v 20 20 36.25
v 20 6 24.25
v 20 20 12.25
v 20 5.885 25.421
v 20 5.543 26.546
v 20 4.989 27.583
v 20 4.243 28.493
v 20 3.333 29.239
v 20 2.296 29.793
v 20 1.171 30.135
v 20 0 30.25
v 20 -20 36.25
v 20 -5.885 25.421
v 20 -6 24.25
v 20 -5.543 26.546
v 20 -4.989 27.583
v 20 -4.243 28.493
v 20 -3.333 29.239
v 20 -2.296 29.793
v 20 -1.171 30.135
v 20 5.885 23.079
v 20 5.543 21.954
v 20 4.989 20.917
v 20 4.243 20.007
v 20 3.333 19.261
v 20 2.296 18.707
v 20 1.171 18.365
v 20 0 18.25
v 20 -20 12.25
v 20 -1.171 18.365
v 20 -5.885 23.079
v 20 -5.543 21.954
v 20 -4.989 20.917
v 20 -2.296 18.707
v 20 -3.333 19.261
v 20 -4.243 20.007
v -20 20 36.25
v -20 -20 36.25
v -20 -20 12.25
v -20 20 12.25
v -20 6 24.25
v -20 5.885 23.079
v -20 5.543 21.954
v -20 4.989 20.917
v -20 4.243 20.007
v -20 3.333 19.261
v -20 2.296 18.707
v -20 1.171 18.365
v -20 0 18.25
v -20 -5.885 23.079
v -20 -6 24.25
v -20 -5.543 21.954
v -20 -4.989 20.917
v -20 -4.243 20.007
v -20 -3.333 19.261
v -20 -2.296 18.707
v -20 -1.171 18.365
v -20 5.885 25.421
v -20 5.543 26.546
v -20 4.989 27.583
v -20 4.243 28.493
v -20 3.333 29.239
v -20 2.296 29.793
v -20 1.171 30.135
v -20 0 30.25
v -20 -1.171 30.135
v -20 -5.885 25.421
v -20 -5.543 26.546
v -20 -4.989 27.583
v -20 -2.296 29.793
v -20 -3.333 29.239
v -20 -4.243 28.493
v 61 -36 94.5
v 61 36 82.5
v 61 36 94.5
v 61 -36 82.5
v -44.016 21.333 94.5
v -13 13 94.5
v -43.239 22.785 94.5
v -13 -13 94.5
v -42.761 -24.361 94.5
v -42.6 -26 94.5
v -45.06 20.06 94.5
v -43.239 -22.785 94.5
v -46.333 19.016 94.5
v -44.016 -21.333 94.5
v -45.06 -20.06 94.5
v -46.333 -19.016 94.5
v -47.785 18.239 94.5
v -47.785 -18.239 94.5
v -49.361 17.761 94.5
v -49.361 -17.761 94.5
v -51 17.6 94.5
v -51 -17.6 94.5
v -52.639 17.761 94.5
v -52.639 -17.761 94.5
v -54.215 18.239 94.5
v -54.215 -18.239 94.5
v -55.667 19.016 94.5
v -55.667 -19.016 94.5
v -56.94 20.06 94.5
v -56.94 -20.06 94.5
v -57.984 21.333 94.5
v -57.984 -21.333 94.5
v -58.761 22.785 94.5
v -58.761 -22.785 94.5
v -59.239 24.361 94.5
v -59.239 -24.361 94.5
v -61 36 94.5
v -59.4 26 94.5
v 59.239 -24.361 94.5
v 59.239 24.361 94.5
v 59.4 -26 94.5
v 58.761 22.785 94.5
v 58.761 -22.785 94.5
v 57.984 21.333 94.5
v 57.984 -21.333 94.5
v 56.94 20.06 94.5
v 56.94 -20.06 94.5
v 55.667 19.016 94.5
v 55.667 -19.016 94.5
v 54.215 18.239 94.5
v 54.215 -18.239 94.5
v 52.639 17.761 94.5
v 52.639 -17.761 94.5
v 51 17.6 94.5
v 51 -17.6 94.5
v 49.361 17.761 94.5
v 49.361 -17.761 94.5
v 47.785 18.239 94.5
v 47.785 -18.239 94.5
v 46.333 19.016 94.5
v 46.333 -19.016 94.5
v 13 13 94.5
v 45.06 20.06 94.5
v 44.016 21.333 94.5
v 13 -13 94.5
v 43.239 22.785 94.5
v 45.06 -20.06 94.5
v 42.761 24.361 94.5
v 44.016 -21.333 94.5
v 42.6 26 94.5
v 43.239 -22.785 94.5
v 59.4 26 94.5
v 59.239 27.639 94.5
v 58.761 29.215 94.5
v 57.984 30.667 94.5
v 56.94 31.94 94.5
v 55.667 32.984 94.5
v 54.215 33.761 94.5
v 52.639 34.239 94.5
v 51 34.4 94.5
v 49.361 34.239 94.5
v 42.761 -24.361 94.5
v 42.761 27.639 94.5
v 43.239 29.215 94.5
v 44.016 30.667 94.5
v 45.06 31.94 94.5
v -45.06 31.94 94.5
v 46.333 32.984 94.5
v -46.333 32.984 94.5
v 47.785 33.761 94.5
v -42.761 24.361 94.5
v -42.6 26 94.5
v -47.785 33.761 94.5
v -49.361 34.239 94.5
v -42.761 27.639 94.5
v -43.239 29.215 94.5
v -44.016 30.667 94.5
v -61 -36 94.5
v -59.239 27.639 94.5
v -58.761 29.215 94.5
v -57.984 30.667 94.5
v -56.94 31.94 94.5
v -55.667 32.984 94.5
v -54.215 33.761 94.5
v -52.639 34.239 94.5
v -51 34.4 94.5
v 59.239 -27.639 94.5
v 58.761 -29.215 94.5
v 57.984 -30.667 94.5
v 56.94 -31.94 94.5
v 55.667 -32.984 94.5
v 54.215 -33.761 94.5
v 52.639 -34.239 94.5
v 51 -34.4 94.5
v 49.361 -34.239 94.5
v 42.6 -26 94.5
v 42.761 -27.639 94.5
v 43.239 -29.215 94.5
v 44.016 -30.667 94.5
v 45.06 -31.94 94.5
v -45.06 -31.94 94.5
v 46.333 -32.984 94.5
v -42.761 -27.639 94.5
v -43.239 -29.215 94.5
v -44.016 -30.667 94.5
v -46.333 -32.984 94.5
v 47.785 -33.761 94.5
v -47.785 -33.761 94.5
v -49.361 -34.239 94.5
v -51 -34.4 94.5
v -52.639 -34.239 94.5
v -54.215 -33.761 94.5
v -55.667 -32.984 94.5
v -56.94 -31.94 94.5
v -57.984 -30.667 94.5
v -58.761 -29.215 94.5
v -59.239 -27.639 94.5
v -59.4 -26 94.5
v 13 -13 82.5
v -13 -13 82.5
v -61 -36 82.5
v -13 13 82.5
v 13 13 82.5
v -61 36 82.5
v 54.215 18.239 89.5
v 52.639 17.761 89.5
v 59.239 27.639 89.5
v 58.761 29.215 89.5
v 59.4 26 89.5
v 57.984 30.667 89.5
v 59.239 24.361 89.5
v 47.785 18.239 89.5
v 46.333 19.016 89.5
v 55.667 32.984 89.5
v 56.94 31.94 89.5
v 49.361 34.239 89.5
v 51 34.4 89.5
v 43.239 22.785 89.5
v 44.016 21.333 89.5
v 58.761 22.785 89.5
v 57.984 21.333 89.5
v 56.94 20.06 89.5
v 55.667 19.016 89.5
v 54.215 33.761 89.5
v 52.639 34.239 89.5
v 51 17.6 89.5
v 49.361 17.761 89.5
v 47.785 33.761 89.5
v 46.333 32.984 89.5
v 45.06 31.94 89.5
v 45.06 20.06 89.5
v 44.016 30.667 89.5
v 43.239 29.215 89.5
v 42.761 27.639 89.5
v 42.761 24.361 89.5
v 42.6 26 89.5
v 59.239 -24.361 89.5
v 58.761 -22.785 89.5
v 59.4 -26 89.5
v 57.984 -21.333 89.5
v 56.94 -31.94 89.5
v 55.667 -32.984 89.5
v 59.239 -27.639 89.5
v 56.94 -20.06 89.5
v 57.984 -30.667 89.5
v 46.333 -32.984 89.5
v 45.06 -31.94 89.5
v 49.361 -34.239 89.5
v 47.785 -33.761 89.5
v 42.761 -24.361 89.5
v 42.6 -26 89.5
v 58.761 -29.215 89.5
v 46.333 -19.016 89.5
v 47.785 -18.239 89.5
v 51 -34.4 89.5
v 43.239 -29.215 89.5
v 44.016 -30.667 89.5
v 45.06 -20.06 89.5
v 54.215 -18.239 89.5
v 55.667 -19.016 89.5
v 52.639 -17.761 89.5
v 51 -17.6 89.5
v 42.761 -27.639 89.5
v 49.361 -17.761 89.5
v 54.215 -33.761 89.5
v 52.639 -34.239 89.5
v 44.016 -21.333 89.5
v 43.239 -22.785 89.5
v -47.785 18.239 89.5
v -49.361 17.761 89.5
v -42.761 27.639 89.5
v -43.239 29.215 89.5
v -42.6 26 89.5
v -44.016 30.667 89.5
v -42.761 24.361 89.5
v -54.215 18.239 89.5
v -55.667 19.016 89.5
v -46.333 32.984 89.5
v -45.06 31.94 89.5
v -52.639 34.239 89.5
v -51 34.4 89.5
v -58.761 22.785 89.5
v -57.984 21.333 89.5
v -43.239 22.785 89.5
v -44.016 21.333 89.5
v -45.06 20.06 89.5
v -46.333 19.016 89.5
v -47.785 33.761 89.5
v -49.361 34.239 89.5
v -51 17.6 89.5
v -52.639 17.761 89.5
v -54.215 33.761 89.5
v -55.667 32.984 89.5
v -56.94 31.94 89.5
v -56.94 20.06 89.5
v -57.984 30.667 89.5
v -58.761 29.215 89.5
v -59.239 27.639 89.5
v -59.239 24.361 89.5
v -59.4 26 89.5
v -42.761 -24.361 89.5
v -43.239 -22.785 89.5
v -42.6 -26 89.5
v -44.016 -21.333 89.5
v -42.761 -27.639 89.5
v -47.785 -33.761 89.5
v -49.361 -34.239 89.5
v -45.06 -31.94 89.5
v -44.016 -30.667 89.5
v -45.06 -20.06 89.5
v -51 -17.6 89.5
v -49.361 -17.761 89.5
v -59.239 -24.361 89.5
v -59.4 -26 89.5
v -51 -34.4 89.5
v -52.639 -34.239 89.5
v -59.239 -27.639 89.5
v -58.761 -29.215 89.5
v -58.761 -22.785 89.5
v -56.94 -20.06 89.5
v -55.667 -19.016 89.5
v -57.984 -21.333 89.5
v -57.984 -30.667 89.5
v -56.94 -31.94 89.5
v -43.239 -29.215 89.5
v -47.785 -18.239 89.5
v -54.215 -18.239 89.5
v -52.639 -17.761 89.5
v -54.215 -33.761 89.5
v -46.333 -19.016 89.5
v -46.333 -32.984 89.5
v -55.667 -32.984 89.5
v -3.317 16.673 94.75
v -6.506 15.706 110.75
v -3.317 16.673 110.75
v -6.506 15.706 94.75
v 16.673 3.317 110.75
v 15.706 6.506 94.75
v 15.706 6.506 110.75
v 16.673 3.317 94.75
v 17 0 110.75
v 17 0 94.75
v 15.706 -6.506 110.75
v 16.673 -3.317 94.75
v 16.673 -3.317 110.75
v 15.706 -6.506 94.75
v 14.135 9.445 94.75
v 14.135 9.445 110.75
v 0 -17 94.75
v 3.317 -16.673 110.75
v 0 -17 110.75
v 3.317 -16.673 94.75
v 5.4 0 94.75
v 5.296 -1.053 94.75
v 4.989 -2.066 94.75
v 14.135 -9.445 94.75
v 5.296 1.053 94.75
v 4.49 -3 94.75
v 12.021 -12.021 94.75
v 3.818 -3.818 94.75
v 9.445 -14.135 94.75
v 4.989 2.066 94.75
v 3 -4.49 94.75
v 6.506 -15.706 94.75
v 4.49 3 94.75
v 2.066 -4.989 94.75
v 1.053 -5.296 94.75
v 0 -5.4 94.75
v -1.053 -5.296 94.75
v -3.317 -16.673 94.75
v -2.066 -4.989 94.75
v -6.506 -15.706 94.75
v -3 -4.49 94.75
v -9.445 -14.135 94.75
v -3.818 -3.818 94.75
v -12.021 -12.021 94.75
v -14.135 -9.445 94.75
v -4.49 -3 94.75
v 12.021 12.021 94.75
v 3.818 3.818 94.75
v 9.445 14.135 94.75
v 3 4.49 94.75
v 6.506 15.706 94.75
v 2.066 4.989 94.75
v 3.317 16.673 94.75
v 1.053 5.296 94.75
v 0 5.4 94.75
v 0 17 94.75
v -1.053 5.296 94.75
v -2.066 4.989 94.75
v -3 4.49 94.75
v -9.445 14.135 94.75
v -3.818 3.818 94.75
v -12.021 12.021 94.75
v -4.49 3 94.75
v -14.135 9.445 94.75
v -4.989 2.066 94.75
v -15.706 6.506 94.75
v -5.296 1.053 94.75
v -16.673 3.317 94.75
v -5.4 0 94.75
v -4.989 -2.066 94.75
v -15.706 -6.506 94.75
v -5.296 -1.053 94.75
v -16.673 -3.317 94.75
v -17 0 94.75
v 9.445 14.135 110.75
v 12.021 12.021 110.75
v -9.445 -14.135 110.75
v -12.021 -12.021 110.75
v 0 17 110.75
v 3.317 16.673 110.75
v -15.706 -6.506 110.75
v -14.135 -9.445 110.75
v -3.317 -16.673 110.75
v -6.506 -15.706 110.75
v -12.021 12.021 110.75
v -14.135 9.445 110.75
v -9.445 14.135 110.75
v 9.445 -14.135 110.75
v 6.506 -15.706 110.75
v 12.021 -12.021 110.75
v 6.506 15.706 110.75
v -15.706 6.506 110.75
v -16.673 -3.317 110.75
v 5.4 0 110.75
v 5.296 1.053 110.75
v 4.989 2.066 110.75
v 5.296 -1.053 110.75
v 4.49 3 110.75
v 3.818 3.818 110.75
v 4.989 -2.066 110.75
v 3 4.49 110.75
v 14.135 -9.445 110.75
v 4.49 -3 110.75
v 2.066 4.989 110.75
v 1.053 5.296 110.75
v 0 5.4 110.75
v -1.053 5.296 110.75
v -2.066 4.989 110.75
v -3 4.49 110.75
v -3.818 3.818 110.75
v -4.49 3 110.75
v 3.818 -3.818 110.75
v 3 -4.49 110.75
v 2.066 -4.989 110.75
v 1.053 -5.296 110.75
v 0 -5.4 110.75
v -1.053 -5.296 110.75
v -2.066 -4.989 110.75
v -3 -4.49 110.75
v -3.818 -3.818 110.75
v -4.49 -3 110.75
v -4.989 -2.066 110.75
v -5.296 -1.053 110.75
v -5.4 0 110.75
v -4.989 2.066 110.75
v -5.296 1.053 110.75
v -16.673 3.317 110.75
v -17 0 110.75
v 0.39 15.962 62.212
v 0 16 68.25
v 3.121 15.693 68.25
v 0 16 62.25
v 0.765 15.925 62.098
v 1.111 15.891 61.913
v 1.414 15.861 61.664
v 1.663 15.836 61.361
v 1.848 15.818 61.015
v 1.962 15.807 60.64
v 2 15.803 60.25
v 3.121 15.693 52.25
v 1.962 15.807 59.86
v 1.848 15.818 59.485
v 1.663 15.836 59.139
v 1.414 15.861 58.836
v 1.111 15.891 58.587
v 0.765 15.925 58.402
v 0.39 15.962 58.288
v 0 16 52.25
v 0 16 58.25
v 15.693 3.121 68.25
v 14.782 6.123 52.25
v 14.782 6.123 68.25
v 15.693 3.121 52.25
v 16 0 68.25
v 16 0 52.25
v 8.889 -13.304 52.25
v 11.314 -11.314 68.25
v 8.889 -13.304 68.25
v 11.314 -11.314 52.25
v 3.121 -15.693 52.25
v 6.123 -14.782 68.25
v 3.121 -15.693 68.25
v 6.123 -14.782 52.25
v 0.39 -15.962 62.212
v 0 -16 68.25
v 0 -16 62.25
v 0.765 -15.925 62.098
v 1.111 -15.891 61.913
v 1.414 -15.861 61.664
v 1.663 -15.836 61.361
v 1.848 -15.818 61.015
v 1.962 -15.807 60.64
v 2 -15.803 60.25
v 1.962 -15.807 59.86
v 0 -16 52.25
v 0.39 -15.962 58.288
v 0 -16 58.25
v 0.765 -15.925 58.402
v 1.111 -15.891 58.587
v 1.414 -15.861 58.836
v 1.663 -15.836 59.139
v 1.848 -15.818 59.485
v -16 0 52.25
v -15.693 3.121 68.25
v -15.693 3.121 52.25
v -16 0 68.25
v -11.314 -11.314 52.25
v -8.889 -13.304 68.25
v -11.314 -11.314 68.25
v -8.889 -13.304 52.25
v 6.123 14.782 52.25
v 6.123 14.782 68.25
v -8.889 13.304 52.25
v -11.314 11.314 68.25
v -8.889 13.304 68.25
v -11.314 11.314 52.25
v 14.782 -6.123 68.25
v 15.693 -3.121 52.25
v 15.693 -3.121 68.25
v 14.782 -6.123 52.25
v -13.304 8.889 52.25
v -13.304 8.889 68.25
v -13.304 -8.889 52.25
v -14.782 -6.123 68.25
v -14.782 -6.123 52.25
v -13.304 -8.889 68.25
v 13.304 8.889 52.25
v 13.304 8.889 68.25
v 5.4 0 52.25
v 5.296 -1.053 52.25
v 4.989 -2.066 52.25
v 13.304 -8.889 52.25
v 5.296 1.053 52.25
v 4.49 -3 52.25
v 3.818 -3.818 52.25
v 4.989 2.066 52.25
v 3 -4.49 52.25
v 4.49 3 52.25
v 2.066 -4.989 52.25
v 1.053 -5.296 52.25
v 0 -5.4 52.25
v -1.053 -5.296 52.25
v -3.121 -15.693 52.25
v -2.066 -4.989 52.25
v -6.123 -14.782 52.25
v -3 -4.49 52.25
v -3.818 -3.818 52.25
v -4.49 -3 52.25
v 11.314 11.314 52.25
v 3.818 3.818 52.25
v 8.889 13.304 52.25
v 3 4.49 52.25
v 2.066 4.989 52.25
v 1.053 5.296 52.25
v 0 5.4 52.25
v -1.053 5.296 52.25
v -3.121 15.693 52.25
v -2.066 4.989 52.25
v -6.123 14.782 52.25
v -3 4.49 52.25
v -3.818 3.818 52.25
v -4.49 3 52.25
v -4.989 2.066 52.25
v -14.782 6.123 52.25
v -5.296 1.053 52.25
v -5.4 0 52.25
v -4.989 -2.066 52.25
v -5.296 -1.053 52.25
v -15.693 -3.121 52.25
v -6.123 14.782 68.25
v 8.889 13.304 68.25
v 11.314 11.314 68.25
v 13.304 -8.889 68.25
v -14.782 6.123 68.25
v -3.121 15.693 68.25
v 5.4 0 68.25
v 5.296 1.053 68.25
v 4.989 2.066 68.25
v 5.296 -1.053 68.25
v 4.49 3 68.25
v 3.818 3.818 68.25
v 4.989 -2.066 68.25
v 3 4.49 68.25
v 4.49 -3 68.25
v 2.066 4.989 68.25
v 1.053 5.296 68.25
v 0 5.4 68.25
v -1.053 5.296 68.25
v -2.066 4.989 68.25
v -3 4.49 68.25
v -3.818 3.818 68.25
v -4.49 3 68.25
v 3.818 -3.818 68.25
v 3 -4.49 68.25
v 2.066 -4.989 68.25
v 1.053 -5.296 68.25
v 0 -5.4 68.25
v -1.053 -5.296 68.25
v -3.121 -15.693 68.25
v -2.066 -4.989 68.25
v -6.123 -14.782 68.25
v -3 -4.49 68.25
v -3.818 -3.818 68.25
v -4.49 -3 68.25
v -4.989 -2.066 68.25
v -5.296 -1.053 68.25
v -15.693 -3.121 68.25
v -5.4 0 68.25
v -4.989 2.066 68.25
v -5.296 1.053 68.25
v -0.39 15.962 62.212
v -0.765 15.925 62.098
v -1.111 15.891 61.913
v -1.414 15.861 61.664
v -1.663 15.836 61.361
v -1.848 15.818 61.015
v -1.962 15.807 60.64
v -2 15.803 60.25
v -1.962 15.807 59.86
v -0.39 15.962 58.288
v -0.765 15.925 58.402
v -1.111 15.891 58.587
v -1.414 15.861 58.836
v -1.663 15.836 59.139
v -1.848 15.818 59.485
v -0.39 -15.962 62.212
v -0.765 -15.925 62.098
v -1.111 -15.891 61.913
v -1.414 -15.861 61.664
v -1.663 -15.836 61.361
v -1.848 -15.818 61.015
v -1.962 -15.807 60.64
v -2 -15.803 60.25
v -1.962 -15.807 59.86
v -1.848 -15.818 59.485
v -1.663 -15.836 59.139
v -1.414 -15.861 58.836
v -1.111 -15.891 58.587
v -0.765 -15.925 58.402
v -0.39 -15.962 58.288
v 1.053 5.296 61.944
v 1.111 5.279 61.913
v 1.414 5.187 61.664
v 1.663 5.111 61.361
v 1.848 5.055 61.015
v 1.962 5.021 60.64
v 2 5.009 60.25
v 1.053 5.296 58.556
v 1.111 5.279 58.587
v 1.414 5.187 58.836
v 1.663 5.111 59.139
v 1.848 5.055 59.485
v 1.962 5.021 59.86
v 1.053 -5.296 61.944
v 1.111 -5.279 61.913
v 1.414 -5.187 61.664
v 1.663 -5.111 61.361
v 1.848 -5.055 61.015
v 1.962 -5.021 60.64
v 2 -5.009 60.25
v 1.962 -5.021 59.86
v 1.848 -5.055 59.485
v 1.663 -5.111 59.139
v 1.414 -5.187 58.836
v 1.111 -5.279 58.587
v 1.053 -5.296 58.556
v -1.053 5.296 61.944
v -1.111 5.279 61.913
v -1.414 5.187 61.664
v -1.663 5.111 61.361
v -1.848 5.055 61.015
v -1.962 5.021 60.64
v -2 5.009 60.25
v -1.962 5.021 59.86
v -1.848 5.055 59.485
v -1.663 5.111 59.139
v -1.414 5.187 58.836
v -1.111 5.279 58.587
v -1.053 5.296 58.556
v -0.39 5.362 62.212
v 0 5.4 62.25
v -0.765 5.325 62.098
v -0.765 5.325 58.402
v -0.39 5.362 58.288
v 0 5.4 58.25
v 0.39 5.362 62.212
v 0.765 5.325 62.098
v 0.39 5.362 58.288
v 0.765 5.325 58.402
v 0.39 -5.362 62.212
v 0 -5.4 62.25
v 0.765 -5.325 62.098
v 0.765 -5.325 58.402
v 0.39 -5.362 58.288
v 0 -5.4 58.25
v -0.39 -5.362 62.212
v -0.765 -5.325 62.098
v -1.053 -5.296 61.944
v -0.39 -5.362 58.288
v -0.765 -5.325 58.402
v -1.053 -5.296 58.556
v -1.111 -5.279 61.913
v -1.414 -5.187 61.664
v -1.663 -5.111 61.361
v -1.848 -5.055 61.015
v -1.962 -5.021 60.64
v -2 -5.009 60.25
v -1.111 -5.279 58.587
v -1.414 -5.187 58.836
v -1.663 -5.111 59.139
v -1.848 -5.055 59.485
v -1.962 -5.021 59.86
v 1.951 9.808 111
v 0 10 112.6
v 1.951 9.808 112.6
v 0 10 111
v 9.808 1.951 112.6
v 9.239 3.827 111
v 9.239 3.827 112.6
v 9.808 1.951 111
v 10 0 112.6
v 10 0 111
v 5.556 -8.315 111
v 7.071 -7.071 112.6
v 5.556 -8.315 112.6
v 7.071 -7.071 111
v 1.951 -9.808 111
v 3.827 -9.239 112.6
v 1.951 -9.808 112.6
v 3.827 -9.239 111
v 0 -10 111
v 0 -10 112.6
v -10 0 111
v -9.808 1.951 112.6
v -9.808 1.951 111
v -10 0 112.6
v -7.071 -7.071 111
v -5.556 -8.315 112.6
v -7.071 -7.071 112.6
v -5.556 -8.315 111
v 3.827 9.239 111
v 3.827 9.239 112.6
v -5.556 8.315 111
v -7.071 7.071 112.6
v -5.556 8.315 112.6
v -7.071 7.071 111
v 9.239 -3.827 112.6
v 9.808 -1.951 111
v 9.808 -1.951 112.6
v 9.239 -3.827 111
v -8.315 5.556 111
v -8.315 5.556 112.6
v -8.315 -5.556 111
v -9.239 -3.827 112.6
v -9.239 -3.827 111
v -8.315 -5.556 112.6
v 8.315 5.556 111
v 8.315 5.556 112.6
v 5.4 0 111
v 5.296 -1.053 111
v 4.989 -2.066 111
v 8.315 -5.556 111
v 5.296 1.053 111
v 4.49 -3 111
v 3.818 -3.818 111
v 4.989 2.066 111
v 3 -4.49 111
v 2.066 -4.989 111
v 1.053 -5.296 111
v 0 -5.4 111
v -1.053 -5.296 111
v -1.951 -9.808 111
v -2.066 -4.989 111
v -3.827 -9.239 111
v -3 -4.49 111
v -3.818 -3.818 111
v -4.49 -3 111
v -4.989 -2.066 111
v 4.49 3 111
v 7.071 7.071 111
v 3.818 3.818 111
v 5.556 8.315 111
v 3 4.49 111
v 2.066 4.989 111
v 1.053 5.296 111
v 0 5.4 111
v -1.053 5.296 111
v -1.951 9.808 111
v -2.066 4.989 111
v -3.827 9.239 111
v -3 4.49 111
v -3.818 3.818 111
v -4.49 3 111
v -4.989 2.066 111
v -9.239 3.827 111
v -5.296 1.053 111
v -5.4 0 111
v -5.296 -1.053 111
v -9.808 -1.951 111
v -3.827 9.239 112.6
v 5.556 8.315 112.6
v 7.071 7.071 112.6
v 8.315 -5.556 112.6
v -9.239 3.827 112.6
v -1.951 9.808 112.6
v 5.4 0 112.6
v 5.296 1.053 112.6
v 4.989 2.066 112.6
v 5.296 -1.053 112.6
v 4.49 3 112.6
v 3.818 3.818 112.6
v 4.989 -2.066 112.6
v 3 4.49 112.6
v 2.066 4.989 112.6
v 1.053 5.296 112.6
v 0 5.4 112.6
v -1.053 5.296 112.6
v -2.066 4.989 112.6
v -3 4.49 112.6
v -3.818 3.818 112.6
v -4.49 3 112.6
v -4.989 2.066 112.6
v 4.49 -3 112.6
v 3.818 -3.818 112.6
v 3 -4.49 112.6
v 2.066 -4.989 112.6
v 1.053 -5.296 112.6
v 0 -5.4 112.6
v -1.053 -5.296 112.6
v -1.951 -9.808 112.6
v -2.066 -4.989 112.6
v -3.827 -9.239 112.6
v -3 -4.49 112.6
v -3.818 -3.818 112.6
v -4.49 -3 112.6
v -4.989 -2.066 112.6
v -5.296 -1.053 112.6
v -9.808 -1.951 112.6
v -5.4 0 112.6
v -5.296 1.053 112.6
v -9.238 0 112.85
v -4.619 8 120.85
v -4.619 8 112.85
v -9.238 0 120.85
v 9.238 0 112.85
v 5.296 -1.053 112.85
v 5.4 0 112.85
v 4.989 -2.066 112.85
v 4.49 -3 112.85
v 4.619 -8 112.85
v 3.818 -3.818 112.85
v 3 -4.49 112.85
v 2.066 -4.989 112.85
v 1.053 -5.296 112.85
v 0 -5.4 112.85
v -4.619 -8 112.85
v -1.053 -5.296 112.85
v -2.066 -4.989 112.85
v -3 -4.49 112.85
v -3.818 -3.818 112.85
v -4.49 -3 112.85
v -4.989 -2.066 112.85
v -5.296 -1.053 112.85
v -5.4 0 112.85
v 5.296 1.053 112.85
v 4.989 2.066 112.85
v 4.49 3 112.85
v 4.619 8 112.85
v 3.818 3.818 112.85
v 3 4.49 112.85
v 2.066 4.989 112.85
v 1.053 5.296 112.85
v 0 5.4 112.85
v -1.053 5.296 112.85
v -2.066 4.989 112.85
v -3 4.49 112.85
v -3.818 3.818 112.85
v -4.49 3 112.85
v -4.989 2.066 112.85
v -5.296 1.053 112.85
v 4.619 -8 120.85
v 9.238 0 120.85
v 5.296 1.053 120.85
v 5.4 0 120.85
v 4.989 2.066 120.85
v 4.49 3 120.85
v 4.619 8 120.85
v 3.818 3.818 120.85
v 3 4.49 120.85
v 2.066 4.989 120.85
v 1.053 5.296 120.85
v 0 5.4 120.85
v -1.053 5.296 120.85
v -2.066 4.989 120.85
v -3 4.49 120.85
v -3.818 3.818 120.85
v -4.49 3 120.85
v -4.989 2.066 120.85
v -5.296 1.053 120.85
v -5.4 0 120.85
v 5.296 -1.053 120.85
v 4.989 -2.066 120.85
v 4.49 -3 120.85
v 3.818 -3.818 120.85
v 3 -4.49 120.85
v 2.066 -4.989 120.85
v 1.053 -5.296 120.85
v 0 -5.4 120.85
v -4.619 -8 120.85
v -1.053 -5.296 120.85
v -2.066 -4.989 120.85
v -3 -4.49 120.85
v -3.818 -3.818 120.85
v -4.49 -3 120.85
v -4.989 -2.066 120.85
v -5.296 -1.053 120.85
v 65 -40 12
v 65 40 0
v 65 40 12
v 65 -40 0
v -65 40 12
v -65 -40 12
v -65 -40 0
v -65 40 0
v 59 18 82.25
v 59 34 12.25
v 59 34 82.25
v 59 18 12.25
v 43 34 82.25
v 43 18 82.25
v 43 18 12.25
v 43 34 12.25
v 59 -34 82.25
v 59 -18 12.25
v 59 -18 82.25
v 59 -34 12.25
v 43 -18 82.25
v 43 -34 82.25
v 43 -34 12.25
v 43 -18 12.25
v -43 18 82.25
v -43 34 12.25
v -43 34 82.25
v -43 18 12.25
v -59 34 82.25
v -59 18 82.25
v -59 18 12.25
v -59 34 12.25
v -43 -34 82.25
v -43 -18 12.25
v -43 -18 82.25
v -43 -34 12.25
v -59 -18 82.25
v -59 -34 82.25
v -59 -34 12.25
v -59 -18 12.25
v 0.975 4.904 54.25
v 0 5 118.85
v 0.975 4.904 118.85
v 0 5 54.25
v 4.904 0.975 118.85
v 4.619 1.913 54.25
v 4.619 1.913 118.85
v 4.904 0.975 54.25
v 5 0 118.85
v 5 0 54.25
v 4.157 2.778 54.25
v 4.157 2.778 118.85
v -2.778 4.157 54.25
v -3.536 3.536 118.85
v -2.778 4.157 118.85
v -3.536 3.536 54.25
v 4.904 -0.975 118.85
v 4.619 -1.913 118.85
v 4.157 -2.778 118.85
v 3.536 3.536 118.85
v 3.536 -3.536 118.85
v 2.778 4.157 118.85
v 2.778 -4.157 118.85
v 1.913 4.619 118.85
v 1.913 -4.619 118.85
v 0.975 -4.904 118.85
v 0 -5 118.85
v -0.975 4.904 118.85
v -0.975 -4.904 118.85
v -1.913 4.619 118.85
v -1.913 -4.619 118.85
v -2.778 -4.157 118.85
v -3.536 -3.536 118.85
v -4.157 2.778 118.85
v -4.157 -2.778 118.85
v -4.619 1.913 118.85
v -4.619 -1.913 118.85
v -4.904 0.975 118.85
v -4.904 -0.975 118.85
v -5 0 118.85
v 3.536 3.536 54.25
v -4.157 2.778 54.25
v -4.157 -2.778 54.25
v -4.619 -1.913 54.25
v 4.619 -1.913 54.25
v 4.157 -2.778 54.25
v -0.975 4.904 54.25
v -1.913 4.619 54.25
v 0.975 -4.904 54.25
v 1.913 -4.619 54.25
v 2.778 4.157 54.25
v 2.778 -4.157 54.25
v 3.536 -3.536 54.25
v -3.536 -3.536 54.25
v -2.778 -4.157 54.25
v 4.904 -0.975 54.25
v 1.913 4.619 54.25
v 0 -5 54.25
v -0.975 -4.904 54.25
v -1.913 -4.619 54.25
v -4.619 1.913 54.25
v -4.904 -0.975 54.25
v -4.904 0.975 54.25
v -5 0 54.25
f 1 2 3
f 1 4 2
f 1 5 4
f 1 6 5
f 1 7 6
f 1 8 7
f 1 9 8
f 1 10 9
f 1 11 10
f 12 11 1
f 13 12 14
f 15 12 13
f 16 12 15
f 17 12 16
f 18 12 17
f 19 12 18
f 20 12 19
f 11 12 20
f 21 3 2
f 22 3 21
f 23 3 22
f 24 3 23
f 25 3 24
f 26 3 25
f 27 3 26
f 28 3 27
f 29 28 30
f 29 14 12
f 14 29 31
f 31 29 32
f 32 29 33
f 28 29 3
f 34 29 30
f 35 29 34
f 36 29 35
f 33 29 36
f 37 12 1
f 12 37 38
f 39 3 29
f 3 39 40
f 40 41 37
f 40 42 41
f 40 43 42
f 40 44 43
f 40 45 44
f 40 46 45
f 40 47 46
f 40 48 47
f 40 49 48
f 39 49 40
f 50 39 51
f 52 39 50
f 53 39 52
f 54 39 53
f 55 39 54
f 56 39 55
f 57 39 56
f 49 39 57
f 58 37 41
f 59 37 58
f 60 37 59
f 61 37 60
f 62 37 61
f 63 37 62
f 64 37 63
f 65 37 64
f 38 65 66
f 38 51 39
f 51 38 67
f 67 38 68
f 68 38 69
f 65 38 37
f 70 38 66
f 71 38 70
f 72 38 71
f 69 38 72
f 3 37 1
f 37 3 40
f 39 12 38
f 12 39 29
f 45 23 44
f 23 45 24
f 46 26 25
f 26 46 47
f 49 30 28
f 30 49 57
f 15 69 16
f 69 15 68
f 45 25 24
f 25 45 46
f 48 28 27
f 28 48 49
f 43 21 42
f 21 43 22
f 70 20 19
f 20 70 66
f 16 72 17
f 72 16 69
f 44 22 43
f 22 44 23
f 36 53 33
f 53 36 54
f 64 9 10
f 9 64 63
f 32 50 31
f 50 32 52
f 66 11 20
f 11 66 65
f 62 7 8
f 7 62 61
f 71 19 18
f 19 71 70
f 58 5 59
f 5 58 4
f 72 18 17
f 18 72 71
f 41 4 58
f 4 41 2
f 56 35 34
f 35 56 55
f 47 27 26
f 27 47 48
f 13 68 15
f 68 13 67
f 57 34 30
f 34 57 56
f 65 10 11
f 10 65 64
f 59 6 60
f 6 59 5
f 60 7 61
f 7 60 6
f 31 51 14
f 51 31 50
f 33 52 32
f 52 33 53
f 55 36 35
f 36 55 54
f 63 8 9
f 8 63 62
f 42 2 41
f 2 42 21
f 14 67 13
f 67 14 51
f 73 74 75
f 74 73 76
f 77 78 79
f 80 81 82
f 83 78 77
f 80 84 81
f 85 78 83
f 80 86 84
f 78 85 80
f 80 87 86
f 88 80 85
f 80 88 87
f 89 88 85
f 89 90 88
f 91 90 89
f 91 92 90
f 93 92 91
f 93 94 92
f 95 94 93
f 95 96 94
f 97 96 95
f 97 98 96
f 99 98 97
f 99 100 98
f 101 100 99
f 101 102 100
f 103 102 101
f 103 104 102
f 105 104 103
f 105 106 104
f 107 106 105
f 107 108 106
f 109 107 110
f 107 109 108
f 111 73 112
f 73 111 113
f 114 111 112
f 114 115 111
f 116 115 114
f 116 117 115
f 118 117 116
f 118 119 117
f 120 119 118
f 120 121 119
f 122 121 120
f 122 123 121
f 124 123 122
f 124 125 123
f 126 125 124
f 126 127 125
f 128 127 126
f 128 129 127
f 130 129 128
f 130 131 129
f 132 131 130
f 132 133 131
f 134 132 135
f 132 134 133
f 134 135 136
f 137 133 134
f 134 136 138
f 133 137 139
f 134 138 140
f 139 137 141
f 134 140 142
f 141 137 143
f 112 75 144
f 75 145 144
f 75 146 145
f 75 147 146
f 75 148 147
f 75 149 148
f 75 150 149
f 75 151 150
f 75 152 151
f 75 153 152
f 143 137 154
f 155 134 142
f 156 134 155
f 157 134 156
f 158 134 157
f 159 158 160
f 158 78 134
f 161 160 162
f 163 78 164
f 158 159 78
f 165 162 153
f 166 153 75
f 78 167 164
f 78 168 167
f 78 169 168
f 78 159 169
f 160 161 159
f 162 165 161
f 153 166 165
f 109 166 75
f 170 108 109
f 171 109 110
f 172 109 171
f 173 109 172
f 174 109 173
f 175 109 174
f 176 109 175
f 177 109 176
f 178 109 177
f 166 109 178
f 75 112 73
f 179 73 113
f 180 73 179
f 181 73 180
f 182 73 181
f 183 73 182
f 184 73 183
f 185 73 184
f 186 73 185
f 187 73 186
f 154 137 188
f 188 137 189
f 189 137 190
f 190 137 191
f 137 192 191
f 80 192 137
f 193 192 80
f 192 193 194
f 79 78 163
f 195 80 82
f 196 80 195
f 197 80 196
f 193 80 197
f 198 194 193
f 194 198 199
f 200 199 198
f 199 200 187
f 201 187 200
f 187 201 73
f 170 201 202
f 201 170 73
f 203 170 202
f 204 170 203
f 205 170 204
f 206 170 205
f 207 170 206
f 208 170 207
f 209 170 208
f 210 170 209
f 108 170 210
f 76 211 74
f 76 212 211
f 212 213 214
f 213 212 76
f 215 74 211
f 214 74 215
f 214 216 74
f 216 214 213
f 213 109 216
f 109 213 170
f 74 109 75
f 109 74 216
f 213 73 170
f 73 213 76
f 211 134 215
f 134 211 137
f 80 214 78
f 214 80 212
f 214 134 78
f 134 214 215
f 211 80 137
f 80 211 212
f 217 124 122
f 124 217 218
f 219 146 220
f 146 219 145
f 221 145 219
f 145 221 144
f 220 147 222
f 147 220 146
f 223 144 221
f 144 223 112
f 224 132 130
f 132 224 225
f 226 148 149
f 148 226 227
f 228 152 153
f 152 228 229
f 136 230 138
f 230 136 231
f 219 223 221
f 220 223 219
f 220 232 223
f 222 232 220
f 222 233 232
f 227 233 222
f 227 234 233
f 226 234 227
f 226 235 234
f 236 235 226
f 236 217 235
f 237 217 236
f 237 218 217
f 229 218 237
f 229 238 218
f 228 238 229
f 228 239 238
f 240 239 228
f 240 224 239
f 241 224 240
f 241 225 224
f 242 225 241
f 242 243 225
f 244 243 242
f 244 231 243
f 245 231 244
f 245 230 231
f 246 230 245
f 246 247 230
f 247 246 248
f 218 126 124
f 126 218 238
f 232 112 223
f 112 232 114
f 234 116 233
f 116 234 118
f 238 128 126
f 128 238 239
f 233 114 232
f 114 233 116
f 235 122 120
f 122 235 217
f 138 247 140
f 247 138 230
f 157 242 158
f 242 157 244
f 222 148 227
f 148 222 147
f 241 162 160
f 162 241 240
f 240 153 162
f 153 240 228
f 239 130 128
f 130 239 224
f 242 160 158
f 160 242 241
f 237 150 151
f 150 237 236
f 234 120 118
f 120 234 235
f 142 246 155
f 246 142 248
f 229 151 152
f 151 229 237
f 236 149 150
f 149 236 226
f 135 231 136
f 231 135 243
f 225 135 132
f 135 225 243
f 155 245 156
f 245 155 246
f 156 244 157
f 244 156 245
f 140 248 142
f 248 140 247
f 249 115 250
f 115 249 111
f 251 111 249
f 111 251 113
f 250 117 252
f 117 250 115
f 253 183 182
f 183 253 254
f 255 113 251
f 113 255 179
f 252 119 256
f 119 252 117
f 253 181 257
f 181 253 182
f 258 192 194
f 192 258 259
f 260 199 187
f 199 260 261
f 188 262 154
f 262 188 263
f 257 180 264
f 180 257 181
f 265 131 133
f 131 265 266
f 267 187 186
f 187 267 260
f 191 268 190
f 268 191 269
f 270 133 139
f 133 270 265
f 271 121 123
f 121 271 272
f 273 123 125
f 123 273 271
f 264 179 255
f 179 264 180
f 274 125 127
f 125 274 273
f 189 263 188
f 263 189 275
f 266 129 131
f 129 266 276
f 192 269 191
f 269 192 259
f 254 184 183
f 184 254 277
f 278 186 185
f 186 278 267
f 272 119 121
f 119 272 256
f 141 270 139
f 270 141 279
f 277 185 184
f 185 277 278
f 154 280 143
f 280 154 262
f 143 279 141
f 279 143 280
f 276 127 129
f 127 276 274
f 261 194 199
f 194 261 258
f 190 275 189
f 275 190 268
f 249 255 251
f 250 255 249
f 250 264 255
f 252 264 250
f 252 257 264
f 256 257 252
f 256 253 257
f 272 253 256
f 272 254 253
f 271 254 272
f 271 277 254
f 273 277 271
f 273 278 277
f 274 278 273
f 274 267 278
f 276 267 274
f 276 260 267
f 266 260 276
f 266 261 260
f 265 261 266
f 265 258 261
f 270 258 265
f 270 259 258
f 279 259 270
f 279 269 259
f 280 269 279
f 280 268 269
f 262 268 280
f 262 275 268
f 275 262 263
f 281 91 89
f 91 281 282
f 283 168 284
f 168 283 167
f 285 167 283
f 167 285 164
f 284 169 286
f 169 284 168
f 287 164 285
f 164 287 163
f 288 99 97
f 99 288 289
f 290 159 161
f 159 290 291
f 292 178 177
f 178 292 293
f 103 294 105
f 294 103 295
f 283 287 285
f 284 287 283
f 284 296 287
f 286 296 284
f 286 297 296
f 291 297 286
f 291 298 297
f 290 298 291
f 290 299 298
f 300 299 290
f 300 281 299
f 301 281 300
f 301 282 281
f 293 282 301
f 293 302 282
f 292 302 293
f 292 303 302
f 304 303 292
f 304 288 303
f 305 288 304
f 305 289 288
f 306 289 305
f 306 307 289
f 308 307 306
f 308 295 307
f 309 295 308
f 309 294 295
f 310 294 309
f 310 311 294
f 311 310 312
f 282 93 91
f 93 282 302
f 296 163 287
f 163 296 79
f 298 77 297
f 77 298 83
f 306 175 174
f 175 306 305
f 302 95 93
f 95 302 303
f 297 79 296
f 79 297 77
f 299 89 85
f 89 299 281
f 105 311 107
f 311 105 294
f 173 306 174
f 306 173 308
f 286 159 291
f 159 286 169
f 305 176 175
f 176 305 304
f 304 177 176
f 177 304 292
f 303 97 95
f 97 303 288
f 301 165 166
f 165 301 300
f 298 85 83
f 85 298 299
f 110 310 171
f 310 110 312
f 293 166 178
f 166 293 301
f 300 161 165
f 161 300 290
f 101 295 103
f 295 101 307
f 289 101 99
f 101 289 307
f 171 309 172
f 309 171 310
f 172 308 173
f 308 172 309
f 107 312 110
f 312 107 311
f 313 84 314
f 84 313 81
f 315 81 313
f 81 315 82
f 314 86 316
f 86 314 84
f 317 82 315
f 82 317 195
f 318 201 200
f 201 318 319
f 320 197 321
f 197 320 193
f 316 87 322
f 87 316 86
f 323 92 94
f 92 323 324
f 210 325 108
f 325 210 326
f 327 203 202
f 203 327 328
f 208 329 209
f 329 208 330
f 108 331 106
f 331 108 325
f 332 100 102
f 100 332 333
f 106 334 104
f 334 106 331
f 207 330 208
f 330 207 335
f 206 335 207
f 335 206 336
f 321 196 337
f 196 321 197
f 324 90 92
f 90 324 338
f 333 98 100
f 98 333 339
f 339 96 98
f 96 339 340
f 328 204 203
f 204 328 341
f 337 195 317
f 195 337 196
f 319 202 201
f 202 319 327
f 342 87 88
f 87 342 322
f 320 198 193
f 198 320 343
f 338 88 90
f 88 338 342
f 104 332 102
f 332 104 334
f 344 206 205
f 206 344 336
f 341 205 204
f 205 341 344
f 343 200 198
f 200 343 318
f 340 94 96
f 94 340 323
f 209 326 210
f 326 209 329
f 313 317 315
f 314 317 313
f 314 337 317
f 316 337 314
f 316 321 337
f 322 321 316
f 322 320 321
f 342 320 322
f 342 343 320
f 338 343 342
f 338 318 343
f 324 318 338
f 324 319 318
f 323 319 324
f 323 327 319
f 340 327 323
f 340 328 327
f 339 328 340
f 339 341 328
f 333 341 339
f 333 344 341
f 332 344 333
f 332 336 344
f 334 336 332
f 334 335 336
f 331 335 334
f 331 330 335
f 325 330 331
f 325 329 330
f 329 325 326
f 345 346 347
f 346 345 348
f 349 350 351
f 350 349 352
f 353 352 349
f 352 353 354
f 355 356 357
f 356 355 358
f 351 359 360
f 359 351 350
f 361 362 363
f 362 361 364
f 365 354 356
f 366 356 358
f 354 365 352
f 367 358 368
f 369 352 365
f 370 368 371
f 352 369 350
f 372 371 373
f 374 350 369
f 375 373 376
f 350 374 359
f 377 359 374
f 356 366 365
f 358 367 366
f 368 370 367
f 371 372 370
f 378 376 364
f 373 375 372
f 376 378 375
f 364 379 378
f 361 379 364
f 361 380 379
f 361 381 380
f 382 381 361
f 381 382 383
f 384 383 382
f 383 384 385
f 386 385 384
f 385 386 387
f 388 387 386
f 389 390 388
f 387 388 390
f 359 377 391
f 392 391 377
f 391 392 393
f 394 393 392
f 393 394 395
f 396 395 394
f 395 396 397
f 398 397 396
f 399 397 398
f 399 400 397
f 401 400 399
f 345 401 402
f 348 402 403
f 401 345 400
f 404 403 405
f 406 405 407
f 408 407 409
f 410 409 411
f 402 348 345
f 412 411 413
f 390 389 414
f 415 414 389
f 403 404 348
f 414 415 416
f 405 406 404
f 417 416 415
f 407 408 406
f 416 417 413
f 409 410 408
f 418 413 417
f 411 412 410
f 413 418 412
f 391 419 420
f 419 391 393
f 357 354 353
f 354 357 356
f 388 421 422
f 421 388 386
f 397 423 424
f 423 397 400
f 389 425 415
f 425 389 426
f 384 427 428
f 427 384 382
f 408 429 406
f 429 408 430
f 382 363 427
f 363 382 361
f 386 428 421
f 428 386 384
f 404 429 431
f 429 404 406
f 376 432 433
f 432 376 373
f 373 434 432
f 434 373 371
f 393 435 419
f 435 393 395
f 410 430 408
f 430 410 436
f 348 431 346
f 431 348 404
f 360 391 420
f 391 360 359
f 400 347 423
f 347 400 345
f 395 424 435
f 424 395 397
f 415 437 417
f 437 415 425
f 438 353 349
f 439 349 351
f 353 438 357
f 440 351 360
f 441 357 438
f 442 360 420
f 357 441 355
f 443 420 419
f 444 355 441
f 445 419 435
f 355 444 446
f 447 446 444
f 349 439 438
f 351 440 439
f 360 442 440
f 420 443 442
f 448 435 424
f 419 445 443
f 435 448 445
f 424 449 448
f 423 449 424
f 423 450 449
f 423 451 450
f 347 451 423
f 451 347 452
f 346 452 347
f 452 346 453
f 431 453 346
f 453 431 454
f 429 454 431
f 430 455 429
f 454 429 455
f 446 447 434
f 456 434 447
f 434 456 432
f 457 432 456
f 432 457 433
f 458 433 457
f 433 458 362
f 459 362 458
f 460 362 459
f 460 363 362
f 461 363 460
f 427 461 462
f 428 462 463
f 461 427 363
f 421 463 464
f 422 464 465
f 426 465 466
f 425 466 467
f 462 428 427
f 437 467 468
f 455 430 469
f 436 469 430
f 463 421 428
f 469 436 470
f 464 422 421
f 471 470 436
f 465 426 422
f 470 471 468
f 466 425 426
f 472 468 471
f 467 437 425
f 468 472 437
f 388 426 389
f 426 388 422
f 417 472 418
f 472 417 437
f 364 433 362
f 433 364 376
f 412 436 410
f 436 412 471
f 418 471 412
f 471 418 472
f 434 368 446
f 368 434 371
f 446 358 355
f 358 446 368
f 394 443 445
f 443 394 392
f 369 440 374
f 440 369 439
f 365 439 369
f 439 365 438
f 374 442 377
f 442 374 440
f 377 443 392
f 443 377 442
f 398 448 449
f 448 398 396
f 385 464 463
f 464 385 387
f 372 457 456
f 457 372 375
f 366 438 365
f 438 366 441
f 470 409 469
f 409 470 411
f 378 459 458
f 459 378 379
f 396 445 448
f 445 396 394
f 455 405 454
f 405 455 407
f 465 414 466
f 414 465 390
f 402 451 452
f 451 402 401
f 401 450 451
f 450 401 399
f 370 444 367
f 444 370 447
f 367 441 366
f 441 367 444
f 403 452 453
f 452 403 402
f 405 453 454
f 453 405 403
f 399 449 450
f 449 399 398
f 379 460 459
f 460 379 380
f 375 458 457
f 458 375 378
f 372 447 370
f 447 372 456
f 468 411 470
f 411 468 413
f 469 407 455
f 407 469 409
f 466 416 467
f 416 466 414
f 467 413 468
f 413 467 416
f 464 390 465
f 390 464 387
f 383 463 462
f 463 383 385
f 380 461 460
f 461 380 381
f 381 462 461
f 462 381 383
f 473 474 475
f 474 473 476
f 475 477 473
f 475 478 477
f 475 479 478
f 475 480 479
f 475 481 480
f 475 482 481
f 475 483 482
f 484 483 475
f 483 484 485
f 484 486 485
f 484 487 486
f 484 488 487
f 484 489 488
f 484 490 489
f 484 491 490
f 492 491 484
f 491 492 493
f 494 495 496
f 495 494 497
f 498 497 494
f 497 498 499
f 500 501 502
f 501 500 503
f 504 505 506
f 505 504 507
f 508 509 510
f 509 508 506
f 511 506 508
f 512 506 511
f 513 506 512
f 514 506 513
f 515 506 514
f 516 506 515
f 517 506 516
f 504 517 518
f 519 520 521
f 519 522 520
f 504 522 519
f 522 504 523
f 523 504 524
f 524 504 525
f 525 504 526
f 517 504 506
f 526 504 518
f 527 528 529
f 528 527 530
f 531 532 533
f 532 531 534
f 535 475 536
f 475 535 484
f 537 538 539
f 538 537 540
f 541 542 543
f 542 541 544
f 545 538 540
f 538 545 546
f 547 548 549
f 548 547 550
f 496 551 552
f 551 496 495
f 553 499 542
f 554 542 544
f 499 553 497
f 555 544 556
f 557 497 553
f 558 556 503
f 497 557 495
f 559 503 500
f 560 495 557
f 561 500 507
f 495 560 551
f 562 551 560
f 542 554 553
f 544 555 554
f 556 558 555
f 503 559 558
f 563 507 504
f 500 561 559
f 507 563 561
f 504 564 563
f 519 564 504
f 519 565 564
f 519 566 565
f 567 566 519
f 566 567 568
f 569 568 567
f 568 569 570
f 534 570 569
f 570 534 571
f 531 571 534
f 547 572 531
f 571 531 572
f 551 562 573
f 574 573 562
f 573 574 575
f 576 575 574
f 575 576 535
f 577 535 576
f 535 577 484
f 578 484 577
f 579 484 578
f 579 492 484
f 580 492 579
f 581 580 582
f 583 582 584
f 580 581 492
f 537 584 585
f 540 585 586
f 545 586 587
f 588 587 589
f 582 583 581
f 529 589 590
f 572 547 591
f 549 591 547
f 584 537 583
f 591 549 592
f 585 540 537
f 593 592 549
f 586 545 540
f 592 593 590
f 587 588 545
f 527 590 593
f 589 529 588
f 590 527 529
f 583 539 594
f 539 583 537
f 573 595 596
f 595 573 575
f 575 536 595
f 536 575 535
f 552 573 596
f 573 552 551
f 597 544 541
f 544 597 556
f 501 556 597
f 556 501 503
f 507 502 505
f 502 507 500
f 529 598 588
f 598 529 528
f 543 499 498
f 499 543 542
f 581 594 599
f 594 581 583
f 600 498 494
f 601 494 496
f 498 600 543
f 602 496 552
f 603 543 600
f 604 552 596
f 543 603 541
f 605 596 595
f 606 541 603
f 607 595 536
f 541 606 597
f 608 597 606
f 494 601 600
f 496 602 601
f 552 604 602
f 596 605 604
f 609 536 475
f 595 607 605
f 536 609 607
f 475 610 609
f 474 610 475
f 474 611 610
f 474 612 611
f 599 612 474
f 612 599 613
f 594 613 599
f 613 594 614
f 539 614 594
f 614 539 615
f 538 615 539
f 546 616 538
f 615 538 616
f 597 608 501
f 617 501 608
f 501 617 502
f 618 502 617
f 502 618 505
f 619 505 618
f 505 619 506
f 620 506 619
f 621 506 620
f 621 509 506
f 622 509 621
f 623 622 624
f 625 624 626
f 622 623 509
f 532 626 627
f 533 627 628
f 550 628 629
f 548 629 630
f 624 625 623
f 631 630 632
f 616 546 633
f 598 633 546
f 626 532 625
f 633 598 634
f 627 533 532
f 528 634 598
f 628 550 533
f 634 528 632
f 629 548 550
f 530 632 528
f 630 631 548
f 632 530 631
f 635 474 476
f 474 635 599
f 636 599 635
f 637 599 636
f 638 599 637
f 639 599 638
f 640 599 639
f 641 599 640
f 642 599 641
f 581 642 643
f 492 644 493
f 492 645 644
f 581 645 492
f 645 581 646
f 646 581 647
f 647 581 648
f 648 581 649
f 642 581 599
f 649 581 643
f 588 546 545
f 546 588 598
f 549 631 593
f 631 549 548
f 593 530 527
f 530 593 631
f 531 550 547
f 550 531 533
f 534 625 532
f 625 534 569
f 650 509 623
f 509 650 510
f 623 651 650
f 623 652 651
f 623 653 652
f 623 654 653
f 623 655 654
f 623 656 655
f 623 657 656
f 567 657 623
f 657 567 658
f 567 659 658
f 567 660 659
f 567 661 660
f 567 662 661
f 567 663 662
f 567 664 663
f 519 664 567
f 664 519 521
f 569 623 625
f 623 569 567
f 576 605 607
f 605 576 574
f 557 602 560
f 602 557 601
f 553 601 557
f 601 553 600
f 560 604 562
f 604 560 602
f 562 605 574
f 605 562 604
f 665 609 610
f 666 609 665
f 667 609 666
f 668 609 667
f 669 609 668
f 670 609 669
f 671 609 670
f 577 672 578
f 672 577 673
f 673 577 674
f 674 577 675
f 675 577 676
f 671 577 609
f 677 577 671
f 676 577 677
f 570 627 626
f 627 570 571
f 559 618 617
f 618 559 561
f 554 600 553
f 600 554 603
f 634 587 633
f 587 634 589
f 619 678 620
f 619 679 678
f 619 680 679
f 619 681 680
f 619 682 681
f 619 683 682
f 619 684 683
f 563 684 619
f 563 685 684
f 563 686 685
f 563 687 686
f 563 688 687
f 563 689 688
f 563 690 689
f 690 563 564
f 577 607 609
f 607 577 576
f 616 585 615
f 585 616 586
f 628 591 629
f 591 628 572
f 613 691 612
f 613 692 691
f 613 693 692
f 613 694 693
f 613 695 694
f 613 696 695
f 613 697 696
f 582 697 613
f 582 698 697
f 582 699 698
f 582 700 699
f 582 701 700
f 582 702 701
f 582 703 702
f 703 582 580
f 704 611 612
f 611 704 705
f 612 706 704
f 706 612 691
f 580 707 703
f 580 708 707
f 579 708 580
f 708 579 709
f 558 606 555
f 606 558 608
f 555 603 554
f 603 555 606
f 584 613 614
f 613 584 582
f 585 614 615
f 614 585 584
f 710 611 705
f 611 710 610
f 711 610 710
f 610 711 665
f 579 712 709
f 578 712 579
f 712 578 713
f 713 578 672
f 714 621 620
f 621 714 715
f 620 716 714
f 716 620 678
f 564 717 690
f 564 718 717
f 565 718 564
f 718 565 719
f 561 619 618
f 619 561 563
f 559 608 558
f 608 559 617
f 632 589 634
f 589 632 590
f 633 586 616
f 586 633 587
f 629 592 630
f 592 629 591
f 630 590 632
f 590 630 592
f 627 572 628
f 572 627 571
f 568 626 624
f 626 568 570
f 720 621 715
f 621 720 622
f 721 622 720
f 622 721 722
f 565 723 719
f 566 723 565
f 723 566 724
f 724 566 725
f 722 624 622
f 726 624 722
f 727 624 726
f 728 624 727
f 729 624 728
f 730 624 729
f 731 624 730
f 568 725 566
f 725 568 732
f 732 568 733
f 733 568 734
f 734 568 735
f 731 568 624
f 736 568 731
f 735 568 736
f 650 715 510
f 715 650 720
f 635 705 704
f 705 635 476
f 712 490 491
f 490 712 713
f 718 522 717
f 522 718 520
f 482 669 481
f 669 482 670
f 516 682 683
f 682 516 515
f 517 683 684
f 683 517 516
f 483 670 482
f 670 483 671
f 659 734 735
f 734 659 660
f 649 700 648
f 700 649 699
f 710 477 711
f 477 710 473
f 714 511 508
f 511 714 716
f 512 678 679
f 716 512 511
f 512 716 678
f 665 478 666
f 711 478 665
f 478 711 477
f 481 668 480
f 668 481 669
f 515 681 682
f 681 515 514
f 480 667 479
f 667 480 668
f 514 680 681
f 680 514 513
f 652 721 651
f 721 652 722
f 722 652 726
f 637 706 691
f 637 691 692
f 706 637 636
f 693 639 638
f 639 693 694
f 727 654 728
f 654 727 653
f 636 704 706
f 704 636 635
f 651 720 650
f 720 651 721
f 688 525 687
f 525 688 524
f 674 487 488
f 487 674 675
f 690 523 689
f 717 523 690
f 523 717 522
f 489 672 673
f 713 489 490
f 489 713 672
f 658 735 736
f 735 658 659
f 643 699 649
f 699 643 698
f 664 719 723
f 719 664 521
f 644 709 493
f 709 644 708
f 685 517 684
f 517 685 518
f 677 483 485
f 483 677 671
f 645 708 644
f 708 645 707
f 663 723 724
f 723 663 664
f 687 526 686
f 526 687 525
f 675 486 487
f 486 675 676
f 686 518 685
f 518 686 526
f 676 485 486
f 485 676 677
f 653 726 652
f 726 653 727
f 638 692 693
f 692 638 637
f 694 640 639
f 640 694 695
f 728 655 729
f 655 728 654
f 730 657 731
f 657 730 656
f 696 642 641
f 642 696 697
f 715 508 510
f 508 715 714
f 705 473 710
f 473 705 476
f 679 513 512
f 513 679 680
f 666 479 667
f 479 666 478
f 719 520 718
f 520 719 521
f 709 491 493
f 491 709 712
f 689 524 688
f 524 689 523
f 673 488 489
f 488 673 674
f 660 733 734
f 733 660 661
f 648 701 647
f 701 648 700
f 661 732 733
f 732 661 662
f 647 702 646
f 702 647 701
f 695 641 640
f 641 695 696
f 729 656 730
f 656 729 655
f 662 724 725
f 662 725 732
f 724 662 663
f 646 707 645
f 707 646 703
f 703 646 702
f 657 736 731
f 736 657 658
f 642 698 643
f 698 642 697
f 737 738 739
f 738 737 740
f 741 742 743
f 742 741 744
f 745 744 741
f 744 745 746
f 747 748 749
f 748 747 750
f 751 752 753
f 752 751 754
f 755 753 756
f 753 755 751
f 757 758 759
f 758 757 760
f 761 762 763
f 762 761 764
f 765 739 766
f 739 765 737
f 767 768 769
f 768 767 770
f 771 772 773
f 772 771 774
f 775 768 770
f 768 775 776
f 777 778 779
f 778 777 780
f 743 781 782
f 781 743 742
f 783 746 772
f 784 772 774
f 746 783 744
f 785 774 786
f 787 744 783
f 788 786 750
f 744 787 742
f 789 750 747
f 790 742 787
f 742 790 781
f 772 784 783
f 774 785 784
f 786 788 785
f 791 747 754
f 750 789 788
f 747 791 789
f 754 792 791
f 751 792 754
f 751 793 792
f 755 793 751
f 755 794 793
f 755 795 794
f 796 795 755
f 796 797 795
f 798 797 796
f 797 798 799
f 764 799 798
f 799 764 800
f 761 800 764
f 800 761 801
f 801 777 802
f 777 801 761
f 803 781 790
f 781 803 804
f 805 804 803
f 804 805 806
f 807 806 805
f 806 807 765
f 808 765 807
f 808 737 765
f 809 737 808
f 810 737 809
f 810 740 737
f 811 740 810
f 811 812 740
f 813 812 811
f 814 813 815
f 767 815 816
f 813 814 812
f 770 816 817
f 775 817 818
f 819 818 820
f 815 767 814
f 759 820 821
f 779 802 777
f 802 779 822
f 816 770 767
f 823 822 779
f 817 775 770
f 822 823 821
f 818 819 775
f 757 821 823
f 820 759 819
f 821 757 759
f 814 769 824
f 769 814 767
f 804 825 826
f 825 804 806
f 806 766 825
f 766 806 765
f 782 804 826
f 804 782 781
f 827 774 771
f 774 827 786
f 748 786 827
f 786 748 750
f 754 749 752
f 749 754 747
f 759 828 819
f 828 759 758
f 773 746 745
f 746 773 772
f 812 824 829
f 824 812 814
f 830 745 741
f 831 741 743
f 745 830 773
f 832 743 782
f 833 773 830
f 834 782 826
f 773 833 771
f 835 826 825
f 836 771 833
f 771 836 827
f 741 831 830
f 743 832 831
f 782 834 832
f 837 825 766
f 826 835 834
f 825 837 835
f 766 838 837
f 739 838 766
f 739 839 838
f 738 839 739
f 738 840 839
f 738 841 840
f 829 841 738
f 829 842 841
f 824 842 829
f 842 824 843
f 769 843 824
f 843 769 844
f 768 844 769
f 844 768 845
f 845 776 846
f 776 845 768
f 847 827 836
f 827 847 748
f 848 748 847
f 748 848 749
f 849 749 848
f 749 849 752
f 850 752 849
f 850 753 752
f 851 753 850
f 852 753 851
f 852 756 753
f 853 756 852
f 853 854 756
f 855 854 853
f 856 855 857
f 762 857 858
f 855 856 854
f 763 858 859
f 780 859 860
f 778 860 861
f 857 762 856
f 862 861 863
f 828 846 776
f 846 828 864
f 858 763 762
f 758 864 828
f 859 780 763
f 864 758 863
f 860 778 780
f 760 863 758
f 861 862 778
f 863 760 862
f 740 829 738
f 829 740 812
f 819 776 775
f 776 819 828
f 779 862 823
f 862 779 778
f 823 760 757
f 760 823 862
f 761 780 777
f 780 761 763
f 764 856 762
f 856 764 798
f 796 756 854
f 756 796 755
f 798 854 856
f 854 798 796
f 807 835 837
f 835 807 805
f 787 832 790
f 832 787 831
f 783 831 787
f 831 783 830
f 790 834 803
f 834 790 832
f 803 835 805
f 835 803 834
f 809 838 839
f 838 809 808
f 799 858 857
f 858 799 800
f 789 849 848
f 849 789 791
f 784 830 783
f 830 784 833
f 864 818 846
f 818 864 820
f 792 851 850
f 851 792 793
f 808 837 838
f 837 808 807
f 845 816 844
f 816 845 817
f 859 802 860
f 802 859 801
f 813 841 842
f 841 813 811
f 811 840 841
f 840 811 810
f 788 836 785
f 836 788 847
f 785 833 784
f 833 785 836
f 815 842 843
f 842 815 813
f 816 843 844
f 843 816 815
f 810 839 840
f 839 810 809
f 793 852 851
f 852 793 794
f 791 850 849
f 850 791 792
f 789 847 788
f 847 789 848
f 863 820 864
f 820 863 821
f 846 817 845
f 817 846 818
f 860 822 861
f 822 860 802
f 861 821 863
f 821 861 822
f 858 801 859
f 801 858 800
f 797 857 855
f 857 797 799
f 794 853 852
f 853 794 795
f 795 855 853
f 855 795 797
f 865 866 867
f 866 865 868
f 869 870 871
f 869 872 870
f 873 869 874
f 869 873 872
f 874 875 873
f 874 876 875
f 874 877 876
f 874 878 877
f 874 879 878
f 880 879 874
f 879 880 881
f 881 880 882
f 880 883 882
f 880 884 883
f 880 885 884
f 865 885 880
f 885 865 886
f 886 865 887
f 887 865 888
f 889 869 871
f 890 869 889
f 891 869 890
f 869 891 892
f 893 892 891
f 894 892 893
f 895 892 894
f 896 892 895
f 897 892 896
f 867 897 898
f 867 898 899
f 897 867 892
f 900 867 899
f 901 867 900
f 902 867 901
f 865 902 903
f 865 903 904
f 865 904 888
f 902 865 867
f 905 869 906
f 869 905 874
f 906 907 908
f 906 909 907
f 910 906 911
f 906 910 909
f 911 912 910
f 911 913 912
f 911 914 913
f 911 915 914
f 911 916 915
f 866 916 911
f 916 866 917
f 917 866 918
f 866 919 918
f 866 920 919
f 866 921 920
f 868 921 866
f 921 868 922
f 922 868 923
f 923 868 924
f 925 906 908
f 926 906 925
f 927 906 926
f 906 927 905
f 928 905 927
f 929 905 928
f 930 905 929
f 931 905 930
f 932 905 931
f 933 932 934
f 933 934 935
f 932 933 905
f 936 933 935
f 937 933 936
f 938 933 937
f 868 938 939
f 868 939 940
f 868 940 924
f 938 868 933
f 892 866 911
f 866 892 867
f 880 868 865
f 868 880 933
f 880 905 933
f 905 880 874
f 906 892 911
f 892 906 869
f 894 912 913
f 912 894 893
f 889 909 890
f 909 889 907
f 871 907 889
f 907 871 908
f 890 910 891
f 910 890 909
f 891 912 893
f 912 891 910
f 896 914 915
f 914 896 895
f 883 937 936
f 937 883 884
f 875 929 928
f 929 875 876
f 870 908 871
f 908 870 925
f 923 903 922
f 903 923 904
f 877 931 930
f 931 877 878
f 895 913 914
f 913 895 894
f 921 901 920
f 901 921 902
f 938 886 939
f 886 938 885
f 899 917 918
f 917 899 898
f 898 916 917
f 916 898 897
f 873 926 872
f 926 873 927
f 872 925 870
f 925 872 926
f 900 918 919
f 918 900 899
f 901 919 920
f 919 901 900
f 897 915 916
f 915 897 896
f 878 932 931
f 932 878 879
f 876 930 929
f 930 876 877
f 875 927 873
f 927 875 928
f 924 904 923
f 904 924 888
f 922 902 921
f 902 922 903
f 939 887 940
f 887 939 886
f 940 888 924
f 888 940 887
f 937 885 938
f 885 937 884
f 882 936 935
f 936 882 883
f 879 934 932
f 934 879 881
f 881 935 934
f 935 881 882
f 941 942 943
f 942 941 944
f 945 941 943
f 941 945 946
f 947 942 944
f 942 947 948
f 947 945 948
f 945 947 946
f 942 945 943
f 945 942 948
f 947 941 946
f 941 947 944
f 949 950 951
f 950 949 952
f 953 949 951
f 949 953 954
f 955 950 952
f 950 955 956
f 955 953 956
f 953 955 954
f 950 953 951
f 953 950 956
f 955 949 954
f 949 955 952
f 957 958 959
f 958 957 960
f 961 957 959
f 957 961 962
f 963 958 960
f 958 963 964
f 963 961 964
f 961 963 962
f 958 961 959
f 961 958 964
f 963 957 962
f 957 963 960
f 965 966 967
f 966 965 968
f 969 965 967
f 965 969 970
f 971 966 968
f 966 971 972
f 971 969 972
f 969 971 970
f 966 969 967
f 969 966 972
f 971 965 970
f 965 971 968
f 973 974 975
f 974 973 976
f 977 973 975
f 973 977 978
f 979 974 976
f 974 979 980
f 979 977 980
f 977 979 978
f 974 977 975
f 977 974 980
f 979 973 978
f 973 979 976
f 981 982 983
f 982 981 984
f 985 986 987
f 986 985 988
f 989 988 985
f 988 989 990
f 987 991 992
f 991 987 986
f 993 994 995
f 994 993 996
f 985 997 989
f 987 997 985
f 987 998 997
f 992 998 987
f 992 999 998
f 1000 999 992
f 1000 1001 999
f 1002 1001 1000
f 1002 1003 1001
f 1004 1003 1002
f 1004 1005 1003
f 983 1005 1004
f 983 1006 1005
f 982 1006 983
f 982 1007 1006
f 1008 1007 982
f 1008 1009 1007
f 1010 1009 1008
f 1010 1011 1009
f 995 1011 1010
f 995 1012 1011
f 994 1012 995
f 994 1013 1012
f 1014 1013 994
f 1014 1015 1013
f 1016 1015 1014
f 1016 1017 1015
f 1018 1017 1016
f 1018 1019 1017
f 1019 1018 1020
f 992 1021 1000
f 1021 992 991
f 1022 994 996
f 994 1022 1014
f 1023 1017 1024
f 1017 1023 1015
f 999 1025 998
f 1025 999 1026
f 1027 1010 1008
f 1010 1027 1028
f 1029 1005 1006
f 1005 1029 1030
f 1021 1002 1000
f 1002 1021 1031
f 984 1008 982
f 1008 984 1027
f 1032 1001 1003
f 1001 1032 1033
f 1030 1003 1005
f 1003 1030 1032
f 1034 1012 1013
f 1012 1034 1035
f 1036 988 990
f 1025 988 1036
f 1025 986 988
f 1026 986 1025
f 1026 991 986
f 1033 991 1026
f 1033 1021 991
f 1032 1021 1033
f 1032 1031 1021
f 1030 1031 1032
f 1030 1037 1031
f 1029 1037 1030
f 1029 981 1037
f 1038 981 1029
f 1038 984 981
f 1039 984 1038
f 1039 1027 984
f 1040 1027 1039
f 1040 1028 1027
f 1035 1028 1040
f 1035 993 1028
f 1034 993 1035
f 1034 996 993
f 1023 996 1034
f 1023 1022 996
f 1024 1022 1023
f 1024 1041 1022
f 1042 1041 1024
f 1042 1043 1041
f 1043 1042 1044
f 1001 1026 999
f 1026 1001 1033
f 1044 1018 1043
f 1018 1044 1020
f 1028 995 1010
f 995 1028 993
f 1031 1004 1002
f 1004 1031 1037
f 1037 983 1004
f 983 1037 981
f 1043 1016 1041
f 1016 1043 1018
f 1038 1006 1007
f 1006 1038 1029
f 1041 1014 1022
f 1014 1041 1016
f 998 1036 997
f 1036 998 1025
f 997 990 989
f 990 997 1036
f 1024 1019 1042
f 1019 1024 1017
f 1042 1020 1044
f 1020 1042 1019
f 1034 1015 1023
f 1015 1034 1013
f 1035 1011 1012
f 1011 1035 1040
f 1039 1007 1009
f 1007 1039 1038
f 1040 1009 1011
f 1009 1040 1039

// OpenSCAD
$fn = 32;

// ------------------------------------------------------------------------
// Arbor press fixture: screw d10, posts 70 mm, gap 16 mm
// Every part is its own module, assembly() places every instance.
// ------------------------------------------------------------------------

// --- part 1 ---
module press_bed() {
  difference() {
    translate([-65, -40, 0]) cube([130, 80, 12]);
  }
}

// --- part 2 ---
module anvil_block() {
  difference() {
    translate([-20, -20, 0]) cube([40, 40, 24]);
    translate([0, 0, 12]) rotate([0, 90, 0]) cylinder(h = 42, d = 12, center = true);
  }
}

// --- part 3 ---
module press_post_a() {
  translate([-8, -8, 0]) cube([16, 16, 70]);
}

// --- part 4 ---
module press_post_b() {
  translate([-8, -8, 0]) cube([16, 16, 70]);
}

// --- part 5 ---
module press_post_c() {
  translate([-8, -8, 0]) cube([16, 16, 70]);
}

// --- part 6 ---
module press_post_d() {
  translate([-8, -8, 0]) cube([16, 16, 70]);
}

// --- part 7 ---
module press_frame() {
  difference() {
    translate([-61, -36, 0]) cube([122, 72, 12]);
    translate([-13, -13, -1]) cube([26, 26, 14]);
    translate([51, 26, 7]) cylinder(h = 6, d = 16.8);
    translate([51, -26, 7]) cylinder(h = 6, d = 16.8);
    translate([-51, 26, 7]) cylinder(h = 6, d = 16.8);
    translate([-51, -26, 7]) cylinder(h = 6, d = 16.8);
  }
}

// --- part 8 ---
module guide_ring() {
  difference() {
      translate([0, 0, 0]) cylinder(h = 16, d = 34);
      translate([0, 0, -1]) cylinder(h = 18, d = 10.8);
    }
}

// --- part 9 ---
module press_screw() {
  translate([0, 0, -32.3]) cylinder(h = 64.6, d = 10);
}

// --- part 10 ---
module press_head() {
  difference() {
    cylinder(h = 16, d = 32);
    translate([0, 0, -1]) cylinder(h = 18, d = 10.8);
    translate([0, 0, 8]) rotate([90, 0, 0]) cylinder(h = 34, d = 4, center = true);
  }
}

// --- part 11 ---
module nut_washer() {
  difference() {
      translate([0, 0, 0]) cylinder(h = 1.6, d = 20);
      translate([0, 0, -1]) cylinder(h = 3.6, d = 10.8);
    }
}

// --- part 12 ---
module press_nut() {
  difference() {
    linear_extrude(height = 8) polygon(points = [[9.238, 0], [4.619, 8], [-4.619, 8], [-9.238, 0], [-4.619, -8], [4.619, -8]]);
    translate([0, 0, -1]) cylinder(h = 10, d = 10.8);
  }
}

// --- assembly ---
module assembly() {
  color([0.80, 0.24, 0.20]) translate([0, 0, 0]) rotate([0, 0, 0]) press_bed();
  color([0.20, 0.45, 0.75]) translate([0, 0, 12.25]) rotate([0, 0, 0]) anvil_block();
  color([0.25, 0.62, 0.32]) translate([51, 26, 12.25]) rotate([0, 0, 0]) press_post_a();
  color([0.92, 0.70, 0.18]) translate([51, -26, 12.25]) rotate([0, 0, 0]) press_post_b();
  color([0.58, 0.35, 0.70]) translate([-51, 26, 12.25]) rotate([0, 0, 0]) press_post_c();
  color([0.16, 0.66, 0.66]) translate([-51, -26, 12.25]) rotate([0, 0, 0]) press_post_d();
  color([0.85, 0.48, 0.18]) translate([0, 0, 82.5]) rotate([0, 0, 0]) press_frame();
  color([0.55, 0.60, 0.65]) translate([0, 0, 94.75]) rotate([0, 0, 0]) guide_ring();
  color([0.75, 0.30, 0.55]) translate([0, 0, 86.55]) rotate([0, 0, 0]) press_screw();
  color([0.42, 0.52, 0.28]) translate([0, 0, 52.25]) rotate([0, 0, 0]) press_head();
  color([0.80, 0.24, 0.20]) translate([0, 0, 111]) rotate([0, 0, 0]) nut_washer();
  color([0.20, 0.45, 0.75]) translate([0, 0, 112.85]) rotate([0, 0, 0]) press_nut();
}

assembly();
